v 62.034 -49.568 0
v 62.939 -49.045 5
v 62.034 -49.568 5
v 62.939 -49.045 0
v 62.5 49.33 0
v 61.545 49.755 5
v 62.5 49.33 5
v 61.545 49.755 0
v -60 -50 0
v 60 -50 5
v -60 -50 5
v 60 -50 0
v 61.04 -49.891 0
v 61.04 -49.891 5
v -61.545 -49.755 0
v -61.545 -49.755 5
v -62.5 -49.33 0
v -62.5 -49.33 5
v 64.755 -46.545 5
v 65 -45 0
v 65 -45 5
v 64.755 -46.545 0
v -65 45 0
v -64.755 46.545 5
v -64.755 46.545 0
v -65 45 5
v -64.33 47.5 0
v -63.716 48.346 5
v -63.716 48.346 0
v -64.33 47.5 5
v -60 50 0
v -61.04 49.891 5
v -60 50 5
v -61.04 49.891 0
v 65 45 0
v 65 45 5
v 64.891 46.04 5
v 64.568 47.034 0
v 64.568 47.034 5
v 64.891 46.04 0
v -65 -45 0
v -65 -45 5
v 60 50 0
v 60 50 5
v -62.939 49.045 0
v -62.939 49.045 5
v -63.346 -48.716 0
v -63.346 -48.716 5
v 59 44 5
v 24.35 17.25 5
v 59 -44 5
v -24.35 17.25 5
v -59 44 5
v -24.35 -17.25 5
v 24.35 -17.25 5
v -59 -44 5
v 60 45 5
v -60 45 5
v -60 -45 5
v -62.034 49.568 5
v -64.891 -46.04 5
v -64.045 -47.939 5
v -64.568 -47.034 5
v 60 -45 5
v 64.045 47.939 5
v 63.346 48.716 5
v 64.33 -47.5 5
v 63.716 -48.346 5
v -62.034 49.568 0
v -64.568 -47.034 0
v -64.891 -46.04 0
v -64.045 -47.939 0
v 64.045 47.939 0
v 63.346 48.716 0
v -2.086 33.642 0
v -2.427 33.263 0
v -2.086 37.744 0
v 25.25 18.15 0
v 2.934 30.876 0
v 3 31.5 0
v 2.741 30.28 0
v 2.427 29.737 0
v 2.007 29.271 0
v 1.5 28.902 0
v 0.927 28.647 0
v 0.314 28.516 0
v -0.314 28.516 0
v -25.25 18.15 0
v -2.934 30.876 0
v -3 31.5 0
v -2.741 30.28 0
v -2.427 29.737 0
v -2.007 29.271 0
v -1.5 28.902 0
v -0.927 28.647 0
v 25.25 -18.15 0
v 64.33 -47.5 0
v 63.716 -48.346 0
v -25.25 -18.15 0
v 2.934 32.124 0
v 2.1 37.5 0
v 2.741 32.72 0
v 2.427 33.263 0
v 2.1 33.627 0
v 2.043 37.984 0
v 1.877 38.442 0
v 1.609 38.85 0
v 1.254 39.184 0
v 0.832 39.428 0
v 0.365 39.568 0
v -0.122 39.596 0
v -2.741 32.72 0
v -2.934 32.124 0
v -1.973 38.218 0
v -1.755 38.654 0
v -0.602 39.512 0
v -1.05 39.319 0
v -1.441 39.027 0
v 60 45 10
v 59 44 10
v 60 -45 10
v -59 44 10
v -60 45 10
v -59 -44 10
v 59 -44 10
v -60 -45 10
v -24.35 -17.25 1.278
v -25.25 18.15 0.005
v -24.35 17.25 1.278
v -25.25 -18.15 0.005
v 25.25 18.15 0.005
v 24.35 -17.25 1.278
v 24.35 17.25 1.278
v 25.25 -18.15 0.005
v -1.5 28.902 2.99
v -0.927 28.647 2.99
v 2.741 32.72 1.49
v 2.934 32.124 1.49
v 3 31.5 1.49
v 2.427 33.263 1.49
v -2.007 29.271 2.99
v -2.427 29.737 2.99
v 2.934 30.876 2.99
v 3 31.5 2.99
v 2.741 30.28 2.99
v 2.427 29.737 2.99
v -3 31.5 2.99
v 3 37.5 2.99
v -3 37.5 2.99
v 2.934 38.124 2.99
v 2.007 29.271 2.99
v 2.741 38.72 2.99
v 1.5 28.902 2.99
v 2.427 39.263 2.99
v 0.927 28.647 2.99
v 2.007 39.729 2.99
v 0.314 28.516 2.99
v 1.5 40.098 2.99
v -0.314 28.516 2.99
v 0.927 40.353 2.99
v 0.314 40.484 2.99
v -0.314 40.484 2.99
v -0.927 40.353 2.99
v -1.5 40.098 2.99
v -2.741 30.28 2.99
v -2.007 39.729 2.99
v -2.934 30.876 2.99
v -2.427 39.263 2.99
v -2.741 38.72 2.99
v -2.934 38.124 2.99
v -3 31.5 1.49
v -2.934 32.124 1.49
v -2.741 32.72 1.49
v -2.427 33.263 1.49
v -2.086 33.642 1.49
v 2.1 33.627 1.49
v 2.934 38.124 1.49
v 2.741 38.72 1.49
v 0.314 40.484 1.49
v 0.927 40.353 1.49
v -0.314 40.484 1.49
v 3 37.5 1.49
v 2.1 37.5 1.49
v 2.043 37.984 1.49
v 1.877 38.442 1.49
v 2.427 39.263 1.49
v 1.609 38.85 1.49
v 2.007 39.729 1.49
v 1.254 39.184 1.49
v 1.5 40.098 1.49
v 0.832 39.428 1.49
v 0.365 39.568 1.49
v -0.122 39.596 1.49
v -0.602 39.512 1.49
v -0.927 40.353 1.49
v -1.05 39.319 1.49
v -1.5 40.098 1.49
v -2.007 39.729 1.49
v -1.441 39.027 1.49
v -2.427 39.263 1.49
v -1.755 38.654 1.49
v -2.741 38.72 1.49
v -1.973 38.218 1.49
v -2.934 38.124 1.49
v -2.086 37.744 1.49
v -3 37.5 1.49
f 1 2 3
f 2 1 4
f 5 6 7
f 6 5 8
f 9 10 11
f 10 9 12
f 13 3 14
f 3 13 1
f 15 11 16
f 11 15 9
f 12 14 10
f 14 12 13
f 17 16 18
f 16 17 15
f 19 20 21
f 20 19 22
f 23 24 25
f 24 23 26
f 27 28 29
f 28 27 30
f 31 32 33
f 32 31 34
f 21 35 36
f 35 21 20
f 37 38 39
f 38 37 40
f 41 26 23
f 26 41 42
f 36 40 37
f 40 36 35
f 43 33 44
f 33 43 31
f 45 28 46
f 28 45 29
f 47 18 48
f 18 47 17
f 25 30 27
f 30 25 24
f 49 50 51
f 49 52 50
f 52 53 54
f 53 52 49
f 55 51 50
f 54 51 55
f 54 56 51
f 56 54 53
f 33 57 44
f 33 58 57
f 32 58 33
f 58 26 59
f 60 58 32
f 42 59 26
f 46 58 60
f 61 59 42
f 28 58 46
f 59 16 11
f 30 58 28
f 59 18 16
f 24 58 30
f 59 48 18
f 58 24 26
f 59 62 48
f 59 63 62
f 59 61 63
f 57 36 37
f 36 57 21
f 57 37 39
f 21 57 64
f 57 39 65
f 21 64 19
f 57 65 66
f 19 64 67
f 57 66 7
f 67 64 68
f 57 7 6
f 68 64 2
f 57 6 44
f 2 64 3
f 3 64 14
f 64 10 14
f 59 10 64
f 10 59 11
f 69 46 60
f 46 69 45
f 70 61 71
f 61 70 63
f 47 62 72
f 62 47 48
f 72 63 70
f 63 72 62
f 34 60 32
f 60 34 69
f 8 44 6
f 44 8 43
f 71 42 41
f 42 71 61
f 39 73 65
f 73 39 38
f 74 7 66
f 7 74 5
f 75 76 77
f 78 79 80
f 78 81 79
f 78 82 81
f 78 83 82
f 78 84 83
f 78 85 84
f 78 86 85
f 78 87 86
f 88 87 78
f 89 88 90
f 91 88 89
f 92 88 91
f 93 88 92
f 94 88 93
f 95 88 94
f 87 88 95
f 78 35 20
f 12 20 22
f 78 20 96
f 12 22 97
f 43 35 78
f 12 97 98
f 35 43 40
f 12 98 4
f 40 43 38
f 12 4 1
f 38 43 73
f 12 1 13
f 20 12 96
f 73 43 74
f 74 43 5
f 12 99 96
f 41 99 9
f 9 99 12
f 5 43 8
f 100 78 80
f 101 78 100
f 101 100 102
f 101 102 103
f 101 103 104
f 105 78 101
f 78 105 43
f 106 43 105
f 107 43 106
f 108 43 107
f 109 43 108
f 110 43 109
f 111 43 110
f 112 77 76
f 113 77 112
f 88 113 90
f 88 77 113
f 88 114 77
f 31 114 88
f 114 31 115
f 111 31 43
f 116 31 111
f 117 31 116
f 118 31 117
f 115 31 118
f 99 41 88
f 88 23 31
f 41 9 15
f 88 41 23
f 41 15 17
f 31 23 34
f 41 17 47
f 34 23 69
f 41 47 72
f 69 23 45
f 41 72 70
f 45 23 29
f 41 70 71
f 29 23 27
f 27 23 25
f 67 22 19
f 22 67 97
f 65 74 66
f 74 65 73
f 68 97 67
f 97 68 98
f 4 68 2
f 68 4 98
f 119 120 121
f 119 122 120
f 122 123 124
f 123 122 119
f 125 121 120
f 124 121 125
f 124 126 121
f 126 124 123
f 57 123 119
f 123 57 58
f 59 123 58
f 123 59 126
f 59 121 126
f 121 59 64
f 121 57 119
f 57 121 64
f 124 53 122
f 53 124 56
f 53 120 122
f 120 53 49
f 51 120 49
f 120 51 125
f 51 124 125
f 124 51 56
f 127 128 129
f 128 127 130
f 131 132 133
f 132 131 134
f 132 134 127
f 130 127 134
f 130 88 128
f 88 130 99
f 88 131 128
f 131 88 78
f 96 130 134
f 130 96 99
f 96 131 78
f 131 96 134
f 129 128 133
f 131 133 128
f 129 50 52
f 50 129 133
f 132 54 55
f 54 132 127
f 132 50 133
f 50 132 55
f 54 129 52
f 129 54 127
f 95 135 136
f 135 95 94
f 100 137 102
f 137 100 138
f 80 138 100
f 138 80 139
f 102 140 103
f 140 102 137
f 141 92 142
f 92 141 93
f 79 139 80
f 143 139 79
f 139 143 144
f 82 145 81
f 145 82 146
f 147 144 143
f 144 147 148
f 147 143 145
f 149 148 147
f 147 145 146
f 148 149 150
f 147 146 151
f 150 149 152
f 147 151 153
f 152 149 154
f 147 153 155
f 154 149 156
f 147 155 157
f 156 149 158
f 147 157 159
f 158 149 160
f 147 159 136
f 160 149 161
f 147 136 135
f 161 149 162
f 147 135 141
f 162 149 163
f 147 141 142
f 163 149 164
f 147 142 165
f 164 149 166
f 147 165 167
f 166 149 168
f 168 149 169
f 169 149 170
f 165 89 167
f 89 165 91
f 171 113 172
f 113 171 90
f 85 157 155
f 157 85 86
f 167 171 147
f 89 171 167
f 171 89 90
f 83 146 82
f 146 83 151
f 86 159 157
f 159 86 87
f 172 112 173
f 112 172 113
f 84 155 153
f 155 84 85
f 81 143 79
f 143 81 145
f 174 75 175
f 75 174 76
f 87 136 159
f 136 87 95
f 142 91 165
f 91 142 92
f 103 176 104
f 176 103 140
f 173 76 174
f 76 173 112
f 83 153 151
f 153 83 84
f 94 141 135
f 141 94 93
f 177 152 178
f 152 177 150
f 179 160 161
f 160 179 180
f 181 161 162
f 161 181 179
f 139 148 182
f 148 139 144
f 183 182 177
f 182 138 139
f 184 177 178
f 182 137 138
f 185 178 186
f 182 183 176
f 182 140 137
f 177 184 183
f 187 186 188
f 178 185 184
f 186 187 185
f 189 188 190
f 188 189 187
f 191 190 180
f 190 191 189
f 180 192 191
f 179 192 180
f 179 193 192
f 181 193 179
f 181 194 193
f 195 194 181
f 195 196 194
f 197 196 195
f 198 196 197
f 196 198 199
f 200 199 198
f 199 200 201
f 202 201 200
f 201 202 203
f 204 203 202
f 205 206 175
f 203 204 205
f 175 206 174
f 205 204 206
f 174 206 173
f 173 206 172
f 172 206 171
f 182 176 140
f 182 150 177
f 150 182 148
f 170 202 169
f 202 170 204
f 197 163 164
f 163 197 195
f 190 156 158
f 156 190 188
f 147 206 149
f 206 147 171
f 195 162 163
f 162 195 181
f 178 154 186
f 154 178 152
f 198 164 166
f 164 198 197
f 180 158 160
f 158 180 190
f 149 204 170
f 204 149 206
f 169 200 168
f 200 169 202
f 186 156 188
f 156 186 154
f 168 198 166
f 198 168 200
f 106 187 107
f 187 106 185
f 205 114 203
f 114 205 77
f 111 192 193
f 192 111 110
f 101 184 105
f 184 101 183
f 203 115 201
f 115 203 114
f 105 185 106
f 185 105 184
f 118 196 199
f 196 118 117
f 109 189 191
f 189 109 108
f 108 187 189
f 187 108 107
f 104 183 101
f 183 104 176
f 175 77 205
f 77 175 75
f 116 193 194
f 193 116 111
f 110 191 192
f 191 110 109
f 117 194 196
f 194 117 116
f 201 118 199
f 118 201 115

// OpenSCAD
// file: switch.scad
// harsh approximation of KCD1-11 switch

front_panel_width = 15;
front_panel_height = 10;

// function for the sake of export
function get_switch_body_dimensions() = [10, 14, 9];

switch_body_dimensions = get_switch_body_dimensions();

module switch(body_offset = 0) {
  body_depth = switch_body_dimensions.x;
  color("#1b1b1be8") {
    translate([body_depth / 2, front_panel_width / 2, front_panel_height / 2]) {
      rotate([0, -90, 0]) {
        // front panel
        translate([0, 0, body_depth / 2 + 0.25]) {
          hull() {
            translate([0, 0, 0.25]) {
              cube([front_panel_height - 1, front_panel_width - 1, 1], center=true);
            }
            cube([front_panel_height, front_panel_width, 0.5], center=true);
          }
        }

        // main body
        cube([switch_body_dimensions.z + body_offset, switch_body_dimensions.y + body_offset, body_depth], center=true);

        // pins
        for (i = [-1:1]) {
          translate([0, 5 * i, -5.5]) {
            cube([4, 2, 1], center=true);
            translate([0, 0, -2]) {
              cube([3.7, 0.5, 3], center=true);
            }
          }
        }
      }
    }
  }
}

switch();
// file: frame.scad
include <common.scad>

//only for preview
use <lithophane-box.scad>
frame_vars = packed_frame_vars();
lithophane_vars = packed_lithophane_vars();

notch_width = frame_notch_width;
notch_height = frame_notch_height;

module notch() {
  color("#ca5a109f") {
    translate([-notch_width / 2, 0, notch_height]) {
      rotate([0, 90, 0]) {
        linear_extrude(height=notch_width) {
          polygon(
            points=[
              [-notch_height / 2, 0],
              [notch_height, 0],
              [0, notch_height],
            ]
          );
        }
      }
    }
  }
}

function get_notch_offset(frame_vars, lithophane_vars) =
  let (
    lithophane_width = get_lithophane_width(lithophane_vars),
    lithophane_height = get_lithophane_height(lithophane_vars),
    lithophane_thickness = get_lithophane_thickness(lithophane_vars),
    lip_depth = get_lip_depth(frame_vars)
  ) [
      lithophane_width / 2 - notch_width * 1.5,
      -lithophane_height / 2,
      lip_depth + lithophane_thickness,
  ];

module notch_pair(notch_offset) {
  translate([0, notch_offset.y, 0]) notch();
  mirror([0, 1, 0]) translate([0, notch_offset.y, 0]) notch();
}

module led_strip(frame_vars, lithophane_vars) {
  translate(
    [0, 0, get_led_strip_start(frame_vars, lithophane_vars)]
  ) {
    color("#e7f071ff") {
      linear_extrude(led_strip_thickness) {
        difference() {
          offset(delta=0.3) lithophane_surface(lithophane_vars);
          offset(delta=-1) lithophane_surface(lithophane_vars);
        }
      }
    }
    color("#000") {
      translate([0, get_lithophane_height(lithophane_vars) / 2 - 1, 3])
        rotate([90, 0, 0])
          linear_extrude(height=0.01)
            text("LED Strip preview", size=3, halign="center");
    }
  }
}

module frame_with_notches(frame_vars, lithophane_vars) {
  lip_depth = get_lip_depth(frame_vars);
  union() {
    color("#0abeebab") {
      // walls
      linear_extrude(
        height=get_wall_height(frame_vars, lithophane_vars)
      ) {
        difference() {
          box_surface(get_wall_thickness(frame_vars), lithophane_vars);
          lithophane_surface(lithophane_vars);
        }
      }

      // thin frame in front of lithophane
      linear_extrude(lip_depth) {
        difference() {
          lithophane_surface(lithophane_vars);
          offset(r=3) offset(delta=-4) lithophane_surface(lithophane_vars);
        }
      }
    }

    notch_offset = get_notch_offset(frame_vars, lithophane_vars);

    // notches to secure lithophane in place
    translate([0, 0, notch_offset.z]) {
      translate([notch_offset.x, 0, 0]) notch_pair(notch_offset);
      translate([-notch_offset.x, 0, 0]) notch_pair(notch_offset);
    }
  }
}

module frame(frame_vars, lithophane_vars) {

  difference() {
    frame_with_notches(frame_vars, lithophane_vars);
    led_strip(frame_vars, lithophane_vars);
  }
  if ($preview) {
    led_strip(frame_vars, lithophane_vars);
  }
}

frame(frame_vars, lithophane_vars);
// file: battery-box/terminal.scad
$fs = 0.5;

base_terminal_size = [10, 1, 10];

module cutout_base(thickness) {
  translate([0, 0, -0.01]) {
    linear_extrude(thickness + 0.02) {
      hull() {
        translate([0, -2, 0]) circle(0.7);
        translate([0, 2, 0]) circle(0.7);
      }
    }
  }
}

module cutout(dimensions) {
  rotate([-90, -90, 0]) {
    translate(v=[dimensions.z / 2 + dimensions.z / 6, dimensions.x / 2, 0])
      cutout_base(dimensions.y);
    translate(v=[dimensions.z / 2 - dimensions.z / 6, dimensions.x / 2, 0])
      cutout_base(dimensions.y);
  }
}

module terminal(dimensions = [9, 0.5, 9]) {
  difference() {
    scale(
      [
        dimensions.x / base_terminal_size.x,
        dimensions.y / base_terminal_size.y,
        dimensions.z / base_terminal_size.z,
      ]
    )
      translate([0, base_terminal_size.y, base_terminal_size.x]) {
        rotate([90, 90, 0]) {
          linear_extrude(base_terminal_size.y) {
            square([base_terminal_size.x, base_terminal_size.z]);
          }
        }
      }
    cutout(dimensions);
  }
}

terminal();
// file: battery-box/spring.scad
use <terminal.scad>;

base_spring_size = [12, 4];

module spring_half() {

  // dont even ask
  line = concat(
    // flat line
    [[4, 2]],
    // wide curve
    [for (i = [1.5:-0.05:-1.5]) [i, sqrt(1 - ( (i - 1.5) / 3) ^ 2) * 2]],
    // semi-circle (half of the horizontal spring)
    [for (i = [-1.5:0.05:0]) [i, -sqrt(1 - ( (i + 0.75) / 0.75) ^ 2) * 0.75]]
  );

  polygon(concat(line, [for (i = [len(line) - 1:-1:0]) line[i] + [0.001, 0.001]]));
}

module spring_one_side() {
  spring_half();
  rotate([0, 0, 180]) spring_half();
}

module spring(dimensions = [10, 3, 10], thickness = 0.5) {
  spring_scale = [
    (dimensions.x - thickness) / (base_spring_size.x),
    (dimensions.y - thickness) / (base_spring_size.y),
  ];
  spring_size = [
    base_spring_size.x * spring_scale.x,
    base_spring_size.y * spring_scale.y,
  ] + [thickness, thickness];

  // behaves weird in preview
  difference() {
    // scaled spring
    translate(spring_size / 2) {
      linear_extrude(dimensions.z) {
        offset(r=thickness / 2) {
          scale(spring_scale) {
            translate([-3, 0, 0]) spring_one_side();
            mirror([1, 0, 0])
              translate([-3, 0, 0]) spring_one_side();
          }
        }
      }
    }

    // cutout
    cutout_thickness = thickness * 1.53;
    translate([0, dimensions.y - cutout_thickness, 0])
      cutout([dimensions.x, cutout_thickness, dimensions.z]);

    // trim ends
    color("red") {
      translate([-dimensions.x, -0.01, 0])
        cube(dimensions);
      translate([dimensions.x, -0.01, 0])
        cube(dimensions);
    }
  }
}

// cutout();
spring();
// file: lithophane-box.scad
use <frame.scad>
use <backpanel.scad>
use <switch.scad>
include <common.scad>

show_frame = true;
show_backpanel = true;

/* [Lithophane] */
lithophane_width = 120;
lithophane_height = 90;
lithophane_thickness = 4;

function packed_lithophane_vars() =
  [
    lithophane_width,
    lithophane_height,
    lithophane_thickness,
  ];
lithophane_vars = packed_lithophane_vars();

/* [Frame] */
lip_depth = 1;
wall_thickness = 5;

function packed_frame_vars() =
  [
    lip_depth,
    wall_thickness,
  ];
frame_vars = packed_frame_vars();

/* [Battery box] */
battery_count = 3; // I use 3xAAA for 5v LED strip
stack_in_line = false;
notch_width = 1; // .1
battery_type = 1; // [0:AA, 1:AAA]

function packed_battery_vars() =
  [
    battery_count,
    stack_in_line,
    notch_width,
    battery_type,
  ];
battery_vars = packed_battery_vars();

module switch_placed(wall_height, lithophane_vars) {
  lithophane_width = get_lithophane_width(lithophane_vars);
  lithophane_height = get_lithophane_height(lithophane_vars);

  translate(
    [
      -(lithophane_width / 2 + wall_thickness),
      -(lithophane_height / 2 - 3),
      wall_height - get_switch_body_dimensions().z,
    ]
  )
    switch(body_offset=0.1);
}

if (show_frame) {
  difference() {
    frame(frame_vars, lithophane_vars);
    switch_placed(get_wall_height(frame_vars, lithophane_vars), lithophane_vars);
  }
}

if (show_backpanel) {
  lithophane_height = get_lithophane_height(lithophane_vars);
  wall_thickness = get_wall_thickness(frame_vars);
  wall_height = get_wall_height(frame_vars, lithophane_vars);

  backpanel_placement = [0, 0, wall_height + backpanel_thickness];
  backpanel_rotation = [180, 0, 0];
  backpanel_y_offset = show_frame ? lithophane_height + wall_thickness * 3 : 0;

  translate([0, backpanel_y_offset, 0]) {
    rotate(backpanel_rotation) {
      translate(-backpanel_placement) {
        difference() {
          translate(backpanel_placement) {
            rotate(backpanel_rotation) {
              backpanel(wall_thickness, lithophane_vars, battery_vars);
            }
          }
          switch_placed(wall_height, lithophane_vars);
        }
      }
    }
  }
}
// file: battery-box/battery-box.scad
use <spring.scad>;
use <terminal.scad>;

//only for preview
use <../lithophane-box.scad>
default_vars = packed_battery_vars();

function get_battery_count(vars) = vars[0];
function get_stack_in_line(vars) = vars[1];
function get_notch_width(vars) = vars[2];
function get_battery_type(vars) = vars[3];

/* [Hidden] */
battery_sizes = [
  [14.5, 50.5], // AA
  [10.5, 45], // AAA
];

function get_battery_size(vars) = battery_sizes[get_battery_type(vars)];

thickness = 0.8;
spacing = [0.7, 0.5];

spring_thickness = 0.5;

function get_spring_size(vars) =
  let (
    battery_size = get_battery_size(vars)
  ) [battery_size.x, 3, battery_size.x - 0.05];

function get_cell_without_spring_length(vars) =
  let (
    battery_size = get_battery_size(vars)
  ) battery_size.y + spacing.y;

function get_cell_with_spring_length(vars) =
  let (
    spring_size = get_spring_size(vars)
  ) spring_size.y + get_cell_without_spring_length(vars);

function get_battery_box_dimensions(vars) =
  let (
    stack_in_line = get_stack_in_line(vars),
    battery_count = get_battery_count(vars),
    battery_size = get_battery_size(vars),
    cell_with_spring_length = get_cell_with_spring_length(vars),
    cell_without_spring_length = get_cell_without_spring_length(vars)
  ) (stack_in_line) ?
    [
      battery_size.x + spacing.x * 2,
      // wall_length
      cell_with_spring_length + cell_without_spring_length * (battery_count - 1),
      battery_size.x,
    ]
  : [
    battery_size.x * battery_count + spacing.x * (battery_count + 1),
    cell_with_spring_length,
    battery_size.x,
  ];

function get_notch_height(vars) = get_notch_width(vars) * sqrt(2);

module inline_separator(vars) {
  battery_size = get_battery_size(vars);

  translate([0, spacing.y, battery_size.x]) {
    rotate([90, 90, 0]) {
      linear_extrude(spacing.y) {
        difference() {
          polygon([[0, 0], [1, 0], [1, 1], [0, 1], [0.5, 0.5]] * battery_size.x);
          hull() {
            translate([0.5, 0.5] * battery_size.x) circle(r=0.3 * battery_size.x);
            translate([0, 0.2] * battery_size.x) square([0.1, 0.6] * battery_size.x);
          }
        }
      }
    }
  }
}

module parallel_separator(vars) {
  battery_size = get_battery_size(vars);
  cell_with_spring_length = get_cell_with_spring_length(vars);

  translate([0, 0, battery_size.x]) {
    rotate([0, 90, 0]) {
      linear_extrude(spacing.x) {
        difference() {
          intersection() {
            offset(r=-1)
              offset(r=2) {
                polygon(
                  [
                    for (
                      dim = [
                        [0.1, 0],
                        [1, 0],
                        [1, 1],
                        [0.1, 1],
                        [0.1, 0.85],
                        [0.5, 0.85],
                        [0.5, 0.15],
                        [0.1, 0.15],
                      ]
                    ) [dim.x * battery_size.x, dim.y * cell_with_spring_length],
                  ]
                );
              }
            square([battery_size.x, cell_with_spring_length]);
          }
          slot_offset = spacing.y;
          slot_width = spacing.y * 1.5;
          translate(
            [
              battery_size.x * 0.15,
              cell_with_spring_length - slot_offset - slot_width,
            ]
          )
            square([battery_size.x * 0.7, slot_width]);
          translate([battery_size.x * 0.15, slot_offset])
            square([battery_size.x * 0.7, slot_width]);
        }
      }
    }
  }
}

module cell_with_spring(vars) {
  spring_size = get_spring_size(vars);
  battery_size = get_battery_size(vars);

  spring_offset = [0, 0.5];
  spring(spring_size);
  linear_extrude(thickness)
    translate([0, spring_size.y] + spring_offset)
      square(battery_size - spring_offset);
}

module cell_without_spring(vars) {
  battery_size = get_battery_size(vars);

  linear_extrude(thickness)
    square(battery_size);
}

module wall(vars, length) {
  battery_size = get_battery_size(vars);

  linear_extrude(height=battery_size.x)
    square([spacing.x, length]);
}

module wall_without_spring(vars) {
  wall(vars, get_cell_without_spring_length(vars));
}

module terminal_sized(vars) {
  battery_size = get_battery_size(vars);

  terminal([battery_size.x, spacing.y, battery_size.x]);
}

module notch(vars) {
  box_dimensions = get_battery_box_dimensions(vars);
  notch_width = get_notch_width(vars);

  notch_base_size = [
    box_dimensions.x,
    box_dimensions.y,
    0.01,
  ];
  difference() {
    hull() {
      cube(notch_base_size, center=true);
      translate([0, 0, get_notch_height(vars)])
        cube(notch_base_size + notch_width * 2 * [1, 1, 0], center=true);
    }
    cube(box_dimensions, center=true);
  }
}

module battery_box(vars) {
  battery_count = get_battery_count(vars);
  stack_in_line = get_stack_in_line(vars);
  battery_size = get_battery_size(vars);
  cell_with_spring_length = get_cell_with_spring_length(vars);
  cell_without_spring_length = get_cell_without_spring_length(vars);
  spring_size = get_spring_size(vars);

  first_cell_size = [battery_size.x, spring_size.y + battery_size.y];
  inline_cell_size = [battery_size.x, spacing.y + battery_size.y];
  parallel_cell_size = [spacing.x + battery_size.x, battery_size.y];
  if (stack_in_line) {
    wall_length = cell_with_spring_length + cell_without_spring_length * (battery_count - 1);
    wall(vars, wall_length);
    translate([spacing.x, 0]) {
      cell_with_spring(vars);
      translate([spring_size.x, 0]) {
        wall(vars, wall_length);
      }
    }
    if (battery_count > 1) {
      for (i = [1:battery_count - 1]) {
        offset = [0, first_cell_size.y + inline_cell_size.y * (i - 1)];
        translate(offset) {
          translate([spacing.x, 0]) {
            inline_separator(vars);
            translate([0, spacing.y]) cell_without_spring(vars);
          }
        }
      }
    }
    translate(
      [spacing.x, first_cell_size.y + inline_cell_size.y * (battery_count - 1)]
    ) {
      terminal_sized(vars);
    }
  } else {
    wall(vars, cell_with_spring_length);
    translate(
      [
        spacing.x + first_cell_size.x + parallel_cell_size.x * (battery_count - 1),
        0,
      ]
    ) {
      wall(vars, cell_with_spring_length);
    }
    translate([spacing.x, 0]) {
      cell_with_spring(vars);
      translate([0, first_cell_size.y, 0]) terminal_sized(vars);
      if (battery_count > 1) {
        for (i = [1:battery_count - 1]) {
          offset = [first_cell_size.x + parallel_cell_size.x * (i - 1), 0];
          translate(offset) {
            parallel_separator(vars);
            if (i % 2 == 1) {
              translate([0, first_cell_size.y + spacing.y])
                mirror([0, 1, 0]) {
                  translate([spacing.x, 0]) cell_with_spring(vars);
                  translate([spacing.x, first_cell_size.y, 0]) terminal_sized(vars);
                }
            } else {
              translate([spacing.x, 0]) cell_with_spring(vars);
              translate([spacing.x, first_cell_size.y, 0]) terminal_sized(vars);
            }
          }
        }
      }
    }
  }

  box_dimensions = get_battery_box_dimensions(vars);
  translate(
    box_dimensions / 2 + [0, 0, box_dimensions.z / 2 - get_notch_height(vars)]
  )
    notch(vars);
}

module battery_box_cutout(vars) {
  box_dimensions = get_battery_box_dimensions(vars);

  translation_up = [0, 0, box_dimensions.z / 2];
  color("#d888") {
    translate(translation_up) {
      cube(box_dimensions + [0.2, 0.2, 0.2], center=true);
      translate([0, 0, box_dimensions.z / 2 - get_notch_height(vars)])
        notch(vars);
    }
  }
}

if ($preview) {
  box_dimensions = get_battery_box_dimensions(default_vars);
  translate(
    [box_dimensions.x, box_dimensions.y, 0] / 2 + (
      [box_dimensions.x + 10, 0, 0]
    )
  )
    battery_box_cutout(default_vars);
}

battery_box(default_vars);
echo(str("default_vars = ", default_vars));
// file: common.scad
$fs = 0.5;

// Lithophane
function get_lithophane_width(vars) = vars[0];
function get_lithophane_height(vars) = vars[1];
function get_lithophane_thickness(vars) = vars[2];
function get_lithophane_size(vars) =
  let (
    lithophane_width = get_lithophane_width(vars),
    lithophane_height = get_lithophane_height(vars)
  ) [lithophane_width, lithophane_height];

// Frame
function get_lip_depth(vars) = vars[0];
function get_wall_thickness(vars) = vars[1];

// Back panel
backpanel_thickness = 5;
backpanel_protrusion = 5;

// Advanced
led_strip_thickness = 10;
led_lithophane_spacing = 7;
led_backpanel_spacing = 5;
frame_notch_width = 10;
frame_notch_height = 1.2;

function get_led_strip_start(frame_vars, lithophane_vars) =
  let (
    lip_depth = get_lip_depth(frame_vars),
    lithophane_thickness = get_lithophane_thickness(lithophane_vars)
  ) (
    lip_depth + lithophane_thickness + led_lithophane_spacing
  );

function get_wall_height(frame_vars, lithophane_vars) =
  get_led_strip_start(frame_vars, lithophane_vars) + (
    led_strip_thickness
  ) + (
    backpanel_protrusion
  ) + (
    led_backpanel_spacing
  );

module lithophane_surface(lithophane_vars) {
  square(size=get_lithophane_size(lithophane_vars), center=true);
}

module box_surface(wall_thickness, lithophane_vars) {
  offset(r=wall_thickness) {
    lithophane_surface(lithophane_vars);
  }
}
// main file
include <common.scad>
use <battery-box/battery-box.scad>

//only for preview
use <lithophane-box.scad>

module keyhole(diameter = 5) {
  radius = diameter / 2;
  height = radius;
  inner_radius = radius * 0.7;
  inner_height = height / 2;
  outer_height = height - inner_height;
  cylinder(h=height, r=radius);
  translate([0, 0, outer_height]) {
    hull() {
      cylinder(h=inner_height, r=radius);
      translate([0, diameter, 0])
        cylinder(h=inner_height, r=radius);
    }
  }
  hull() {
    cylinder(h=height, r=inner_radius);
    translate([0, diameter, 0])
      cylinder(h=height, r=inner_radius);
  }
}

module placed_battery_box(battery_vars) {
  rotate([180, 0, 90])
    translate([0, 0, -get_battery_box_dimensions(battery_vars).z])
      battery_box_cutout(battery_vars);
}

module backpanel(wall_thickness, lithophane_vars, battery_vars) {
  difference() {
    color("#055366ab") {
      linear_extrude(backpanel_thickness) {
        box_surface(wall_thickness, lithophane_vars);
      }
      translate([0, 0, backpanel_thickness]) {
        linear_extrude(backpanel_protrusion) {
          difference() {
            lithophane_surface(lithophane_vars);
            offset(delta=-1) {
              lithophane_surface(lithophane_vars);
            }
          }
        }
      }
    }
    placed_battery_box(battery_vars);

    translate([0, get_lithophane_height(lithophane_vars) / 2 * 0.7, -0.01])
      keyhole(diameter=6);
  }
  if ($preview) {
    color("#d882")
      placed_battery_box(battery_vars);
  }
}

backpanel(
  get_wall_thickness(packed_frame_vars()),
  packed_lithophane_vars(),
  packed_battery_vars()
);
